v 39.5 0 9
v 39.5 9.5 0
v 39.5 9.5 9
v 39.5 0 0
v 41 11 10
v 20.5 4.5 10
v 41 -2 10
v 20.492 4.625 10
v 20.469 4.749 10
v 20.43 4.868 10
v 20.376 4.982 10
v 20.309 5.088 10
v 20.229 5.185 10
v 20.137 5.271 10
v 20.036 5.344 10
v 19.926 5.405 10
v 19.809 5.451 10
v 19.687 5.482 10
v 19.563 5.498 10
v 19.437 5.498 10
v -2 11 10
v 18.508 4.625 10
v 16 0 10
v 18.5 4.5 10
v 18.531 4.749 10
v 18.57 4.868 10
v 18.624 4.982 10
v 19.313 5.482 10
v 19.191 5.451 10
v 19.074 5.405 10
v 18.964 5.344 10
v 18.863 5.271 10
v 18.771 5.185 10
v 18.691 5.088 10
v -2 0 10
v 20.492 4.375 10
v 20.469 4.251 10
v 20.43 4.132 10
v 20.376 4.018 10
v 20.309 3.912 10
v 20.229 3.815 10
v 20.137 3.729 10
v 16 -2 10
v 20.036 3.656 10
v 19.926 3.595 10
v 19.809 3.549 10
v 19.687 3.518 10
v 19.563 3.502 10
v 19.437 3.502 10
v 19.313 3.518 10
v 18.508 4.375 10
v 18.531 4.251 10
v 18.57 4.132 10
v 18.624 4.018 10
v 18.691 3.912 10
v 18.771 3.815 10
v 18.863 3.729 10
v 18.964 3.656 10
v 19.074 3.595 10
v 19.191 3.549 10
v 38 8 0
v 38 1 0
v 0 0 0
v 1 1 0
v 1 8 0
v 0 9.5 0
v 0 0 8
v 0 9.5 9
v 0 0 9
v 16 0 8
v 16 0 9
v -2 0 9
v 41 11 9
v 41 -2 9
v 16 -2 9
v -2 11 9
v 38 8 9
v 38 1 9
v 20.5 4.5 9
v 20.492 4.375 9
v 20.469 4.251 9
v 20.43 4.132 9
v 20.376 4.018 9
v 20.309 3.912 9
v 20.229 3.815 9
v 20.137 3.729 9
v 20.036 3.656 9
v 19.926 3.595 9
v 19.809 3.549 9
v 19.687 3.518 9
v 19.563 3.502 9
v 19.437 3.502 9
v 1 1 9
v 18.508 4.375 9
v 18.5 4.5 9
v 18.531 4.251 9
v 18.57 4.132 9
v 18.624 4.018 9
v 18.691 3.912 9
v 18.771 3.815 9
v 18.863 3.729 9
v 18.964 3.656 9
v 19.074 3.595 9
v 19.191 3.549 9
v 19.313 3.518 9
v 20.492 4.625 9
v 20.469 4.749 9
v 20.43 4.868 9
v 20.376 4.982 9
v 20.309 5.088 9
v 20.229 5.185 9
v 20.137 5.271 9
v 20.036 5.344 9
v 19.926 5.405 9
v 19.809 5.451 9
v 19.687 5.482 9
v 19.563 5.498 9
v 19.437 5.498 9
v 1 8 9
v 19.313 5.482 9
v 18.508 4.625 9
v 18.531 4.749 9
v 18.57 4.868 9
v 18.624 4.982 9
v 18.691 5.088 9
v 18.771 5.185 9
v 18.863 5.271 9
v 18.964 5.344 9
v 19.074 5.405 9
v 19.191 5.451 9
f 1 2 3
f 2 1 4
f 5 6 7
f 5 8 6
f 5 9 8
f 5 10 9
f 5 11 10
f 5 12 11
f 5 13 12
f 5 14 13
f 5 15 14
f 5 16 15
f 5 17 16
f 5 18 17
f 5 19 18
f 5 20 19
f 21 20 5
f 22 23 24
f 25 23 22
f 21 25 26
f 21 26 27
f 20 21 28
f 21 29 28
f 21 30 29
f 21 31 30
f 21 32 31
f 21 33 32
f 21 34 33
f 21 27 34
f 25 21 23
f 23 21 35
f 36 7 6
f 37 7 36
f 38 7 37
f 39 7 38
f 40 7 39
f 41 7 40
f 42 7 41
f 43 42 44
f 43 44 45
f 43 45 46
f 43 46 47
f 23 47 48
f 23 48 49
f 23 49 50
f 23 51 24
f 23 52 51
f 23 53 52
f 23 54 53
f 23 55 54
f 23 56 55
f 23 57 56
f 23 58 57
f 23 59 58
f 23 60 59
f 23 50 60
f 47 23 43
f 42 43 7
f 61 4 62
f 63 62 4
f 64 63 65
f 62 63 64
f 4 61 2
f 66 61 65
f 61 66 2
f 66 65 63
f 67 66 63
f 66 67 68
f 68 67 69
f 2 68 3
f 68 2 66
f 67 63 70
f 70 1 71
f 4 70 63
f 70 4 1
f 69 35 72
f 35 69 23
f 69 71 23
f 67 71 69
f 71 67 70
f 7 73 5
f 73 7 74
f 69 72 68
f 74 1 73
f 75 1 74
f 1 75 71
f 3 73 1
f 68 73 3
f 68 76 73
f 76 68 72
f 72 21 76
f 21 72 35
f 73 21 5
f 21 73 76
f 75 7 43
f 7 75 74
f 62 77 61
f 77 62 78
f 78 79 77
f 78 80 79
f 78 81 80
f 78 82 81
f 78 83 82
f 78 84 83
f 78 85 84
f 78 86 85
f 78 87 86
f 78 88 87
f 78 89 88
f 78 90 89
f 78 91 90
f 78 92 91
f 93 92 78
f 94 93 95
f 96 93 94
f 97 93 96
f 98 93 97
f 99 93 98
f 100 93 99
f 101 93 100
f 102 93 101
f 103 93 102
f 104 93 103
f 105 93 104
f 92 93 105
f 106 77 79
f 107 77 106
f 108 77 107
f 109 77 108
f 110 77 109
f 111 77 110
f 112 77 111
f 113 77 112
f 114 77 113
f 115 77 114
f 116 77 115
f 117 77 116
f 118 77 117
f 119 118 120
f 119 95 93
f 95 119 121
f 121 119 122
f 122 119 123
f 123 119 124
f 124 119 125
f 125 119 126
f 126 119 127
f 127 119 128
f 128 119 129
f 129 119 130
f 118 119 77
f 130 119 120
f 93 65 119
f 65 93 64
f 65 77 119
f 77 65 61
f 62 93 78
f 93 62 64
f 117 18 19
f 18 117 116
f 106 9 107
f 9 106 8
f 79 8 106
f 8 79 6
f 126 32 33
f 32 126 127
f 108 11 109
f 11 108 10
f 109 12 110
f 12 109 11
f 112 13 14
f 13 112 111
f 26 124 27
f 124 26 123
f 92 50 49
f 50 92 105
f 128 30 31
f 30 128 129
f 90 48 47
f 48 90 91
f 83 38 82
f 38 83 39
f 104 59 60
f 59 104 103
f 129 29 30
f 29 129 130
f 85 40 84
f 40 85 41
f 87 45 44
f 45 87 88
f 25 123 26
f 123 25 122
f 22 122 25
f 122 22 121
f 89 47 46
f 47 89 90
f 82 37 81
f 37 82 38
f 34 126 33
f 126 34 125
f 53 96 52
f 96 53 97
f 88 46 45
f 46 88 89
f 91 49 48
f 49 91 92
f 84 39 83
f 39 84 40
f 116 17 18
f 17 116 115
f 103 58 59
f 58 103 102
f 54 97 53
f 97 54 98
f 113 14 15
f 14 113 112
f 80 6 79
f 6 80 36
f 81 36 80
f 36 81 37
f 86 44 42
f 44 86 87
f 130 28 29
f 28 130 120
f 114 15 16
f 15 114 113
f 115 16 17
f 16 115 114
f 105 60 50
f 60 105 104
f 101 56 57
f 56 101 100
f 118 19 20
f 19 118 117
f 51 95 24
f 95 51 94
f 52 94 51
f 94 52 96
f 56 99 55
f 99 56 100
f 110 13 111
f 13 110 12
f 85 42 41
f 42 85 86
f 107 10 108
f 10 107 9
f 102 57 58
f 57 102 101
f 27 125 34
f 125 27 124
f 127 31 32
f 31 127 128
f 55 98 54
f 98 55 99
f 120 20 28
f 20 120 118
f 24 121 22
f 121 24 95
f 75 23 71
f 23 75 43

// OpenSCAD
// file: camera+support.scad
boxThickness =2;

module drawCamera(){
	translate([0,-1,-1])cube([27, 26,2]);
	color("black") translate([8.5,5.5,1]) cube([8,8,6]);
	translate([21+3+0.5,-2, -1-6]) rotate([0, 0, 90]) color("brown") cube([9, 22, 6]);
}

module drawOneCameraSupport(){
	translate([0,-3*boxThickness,-2*boxThickness]) cube([8, 6*boxThickness, 4*boxThickness]);
	}

module drawTopCameraSupport(){
	difference(){
		color("red") union(){
			translate([25-2*boxThickness, 0,0]) drawOneCameraSupport();
			translate([25-2*boxThickness, 24,0]) drawOneCameraSupport();
		}
		drawCamera();
	}
}

module drawBottomCameraSupport(){
	difference(){
		color("red") union(){
			translate([-boxThickness,0,0]) drawOneCameraSupport();
			translate([-boxThickness,24,0]) drawOneCameraSupport();
		}
		drawCamera();
	}
}

module drawCameraSupport(){
	difference(){
		color("red") union(){
			//translate([-boxThickness,0,0]) drawOneCameraSupport();
			translate([25-2*boxThickness, 0,0]) drawOneCameraSupport();
			//translate([-boxThickness,24,0]) drawOneCameraSupport();
			translate([25-2*boxThickness, 24,0]) drawOneCameraSupport();
		}
		drawCamera();
	}
}

drawTopCameraSupport();
drawBottomCameraSupport();
drawCamera();
// file: mini_servo.scad
$fn=50;

module miniServo_noir(){
	color("black"){
		cube([22, 11, 21.2]);
		translate([11/2,11/2,-4]) cylinder(h=4, r=11/2);
		translate([-7, 0, 12]) cube([7, 11, 4]);
//		difference(){
			translate([(22-31.6)/2, 0, 0]) cube([31.6,11, 2.2]);
			union(){
				translate([(22-31.6)/4, 11/2, -0.4]) cylinder(r=1.05, h=13);
				translate([-(22-31.6)/4+22, 11/2, -0.4]) cylinder(r=1.05, h=13);
//			}
		}
	}
}

module miniServo_transparent(){
	color("gray"){
		cube([21, 11.2, 14]);
		translate([0,0,-5]) cube([21, 11.2, 5]);
		translate([-7, 0, 9]) cube([7, 11.2, 2]);
		//difference(){
			translate([(21-30)/2, 0, 0]) cube([30, 11.2, 0.8]);
			union(){
				translate([(21-30)/4, 11.2/2, -0.4]) cylinder(r=1.05, h=13);
				translate([-(21-30)/4+22, 11.2/2, -0.4]) cylinder(r=1.05, h=13);
		//	}
		}
	}
}


miniServo_transparent();
translate([0, -15, 0]) miniServo_noir();
// main file
use <mini_servo.scad>
use <camera+support.scad>

$fn=50;

module supportServo(){
	difference(){
		translate([(22-31.6)/2, 0, 0 ]) cube([31.6, 13, 21.2]);
		translate([0,0, -2.2]) miniServo_noir();
	}

	//translate([0,0, -2.2])miniServo_noir();

	translate([0, -1, 0]) difference(){
	translate([(21-30)/2, 0, 21.2+11.2+2]) 
		rotate([90+180, 0, 0]) cube([30, 11.2+2, 14]);
	translate([0, -0.8, 21.2+11.2+2+0.2]) 
	rotate([90+180, 0, 0]) miniServo_transparent();
	}

	//translate([0, 14, 21.2]) 
	//rotate([90+180, 0, 0]) miniServo_transparent();
}

module supportCam(){
	//cube([25, 14, 1]);
	cube([25+5, 24, 2]);
	
	difference() {

		translate([25+3, 0, -6]) cube([2, 24,12]);
		translate([25+3, 12, -3]) rotate([0, 90, 0])cylinder(r=1, h=4);	
	}
	
	
	translate([0, 0, 2]) cube([2, 24,4]);
	translate([25+1, 0, 6]) cube([4, 24,2]);
	translate([0, 0, 6]) cube([4, 24,2]);
	translate([2, 0, 2]) cube([2, 2, 4]);
	translate([26, 0, 2]) cube([2, 2, 4]);
}

difference(){
	union(){
		cube([39.5, 9.5, 10]);
		translate([-2,-2, 9]) cube([39+4, 9+4, 1]);
	}

	union(){
		translate([1,1,0]) cube([39-2, 9-2, 10-1]);
		translate([39/2, 9/2, 8]) cylinder(r=1, h=3);
		translate([-2,-2, 8]) cube([16+2, 2, 4]);
	}
}

//supportCam();
